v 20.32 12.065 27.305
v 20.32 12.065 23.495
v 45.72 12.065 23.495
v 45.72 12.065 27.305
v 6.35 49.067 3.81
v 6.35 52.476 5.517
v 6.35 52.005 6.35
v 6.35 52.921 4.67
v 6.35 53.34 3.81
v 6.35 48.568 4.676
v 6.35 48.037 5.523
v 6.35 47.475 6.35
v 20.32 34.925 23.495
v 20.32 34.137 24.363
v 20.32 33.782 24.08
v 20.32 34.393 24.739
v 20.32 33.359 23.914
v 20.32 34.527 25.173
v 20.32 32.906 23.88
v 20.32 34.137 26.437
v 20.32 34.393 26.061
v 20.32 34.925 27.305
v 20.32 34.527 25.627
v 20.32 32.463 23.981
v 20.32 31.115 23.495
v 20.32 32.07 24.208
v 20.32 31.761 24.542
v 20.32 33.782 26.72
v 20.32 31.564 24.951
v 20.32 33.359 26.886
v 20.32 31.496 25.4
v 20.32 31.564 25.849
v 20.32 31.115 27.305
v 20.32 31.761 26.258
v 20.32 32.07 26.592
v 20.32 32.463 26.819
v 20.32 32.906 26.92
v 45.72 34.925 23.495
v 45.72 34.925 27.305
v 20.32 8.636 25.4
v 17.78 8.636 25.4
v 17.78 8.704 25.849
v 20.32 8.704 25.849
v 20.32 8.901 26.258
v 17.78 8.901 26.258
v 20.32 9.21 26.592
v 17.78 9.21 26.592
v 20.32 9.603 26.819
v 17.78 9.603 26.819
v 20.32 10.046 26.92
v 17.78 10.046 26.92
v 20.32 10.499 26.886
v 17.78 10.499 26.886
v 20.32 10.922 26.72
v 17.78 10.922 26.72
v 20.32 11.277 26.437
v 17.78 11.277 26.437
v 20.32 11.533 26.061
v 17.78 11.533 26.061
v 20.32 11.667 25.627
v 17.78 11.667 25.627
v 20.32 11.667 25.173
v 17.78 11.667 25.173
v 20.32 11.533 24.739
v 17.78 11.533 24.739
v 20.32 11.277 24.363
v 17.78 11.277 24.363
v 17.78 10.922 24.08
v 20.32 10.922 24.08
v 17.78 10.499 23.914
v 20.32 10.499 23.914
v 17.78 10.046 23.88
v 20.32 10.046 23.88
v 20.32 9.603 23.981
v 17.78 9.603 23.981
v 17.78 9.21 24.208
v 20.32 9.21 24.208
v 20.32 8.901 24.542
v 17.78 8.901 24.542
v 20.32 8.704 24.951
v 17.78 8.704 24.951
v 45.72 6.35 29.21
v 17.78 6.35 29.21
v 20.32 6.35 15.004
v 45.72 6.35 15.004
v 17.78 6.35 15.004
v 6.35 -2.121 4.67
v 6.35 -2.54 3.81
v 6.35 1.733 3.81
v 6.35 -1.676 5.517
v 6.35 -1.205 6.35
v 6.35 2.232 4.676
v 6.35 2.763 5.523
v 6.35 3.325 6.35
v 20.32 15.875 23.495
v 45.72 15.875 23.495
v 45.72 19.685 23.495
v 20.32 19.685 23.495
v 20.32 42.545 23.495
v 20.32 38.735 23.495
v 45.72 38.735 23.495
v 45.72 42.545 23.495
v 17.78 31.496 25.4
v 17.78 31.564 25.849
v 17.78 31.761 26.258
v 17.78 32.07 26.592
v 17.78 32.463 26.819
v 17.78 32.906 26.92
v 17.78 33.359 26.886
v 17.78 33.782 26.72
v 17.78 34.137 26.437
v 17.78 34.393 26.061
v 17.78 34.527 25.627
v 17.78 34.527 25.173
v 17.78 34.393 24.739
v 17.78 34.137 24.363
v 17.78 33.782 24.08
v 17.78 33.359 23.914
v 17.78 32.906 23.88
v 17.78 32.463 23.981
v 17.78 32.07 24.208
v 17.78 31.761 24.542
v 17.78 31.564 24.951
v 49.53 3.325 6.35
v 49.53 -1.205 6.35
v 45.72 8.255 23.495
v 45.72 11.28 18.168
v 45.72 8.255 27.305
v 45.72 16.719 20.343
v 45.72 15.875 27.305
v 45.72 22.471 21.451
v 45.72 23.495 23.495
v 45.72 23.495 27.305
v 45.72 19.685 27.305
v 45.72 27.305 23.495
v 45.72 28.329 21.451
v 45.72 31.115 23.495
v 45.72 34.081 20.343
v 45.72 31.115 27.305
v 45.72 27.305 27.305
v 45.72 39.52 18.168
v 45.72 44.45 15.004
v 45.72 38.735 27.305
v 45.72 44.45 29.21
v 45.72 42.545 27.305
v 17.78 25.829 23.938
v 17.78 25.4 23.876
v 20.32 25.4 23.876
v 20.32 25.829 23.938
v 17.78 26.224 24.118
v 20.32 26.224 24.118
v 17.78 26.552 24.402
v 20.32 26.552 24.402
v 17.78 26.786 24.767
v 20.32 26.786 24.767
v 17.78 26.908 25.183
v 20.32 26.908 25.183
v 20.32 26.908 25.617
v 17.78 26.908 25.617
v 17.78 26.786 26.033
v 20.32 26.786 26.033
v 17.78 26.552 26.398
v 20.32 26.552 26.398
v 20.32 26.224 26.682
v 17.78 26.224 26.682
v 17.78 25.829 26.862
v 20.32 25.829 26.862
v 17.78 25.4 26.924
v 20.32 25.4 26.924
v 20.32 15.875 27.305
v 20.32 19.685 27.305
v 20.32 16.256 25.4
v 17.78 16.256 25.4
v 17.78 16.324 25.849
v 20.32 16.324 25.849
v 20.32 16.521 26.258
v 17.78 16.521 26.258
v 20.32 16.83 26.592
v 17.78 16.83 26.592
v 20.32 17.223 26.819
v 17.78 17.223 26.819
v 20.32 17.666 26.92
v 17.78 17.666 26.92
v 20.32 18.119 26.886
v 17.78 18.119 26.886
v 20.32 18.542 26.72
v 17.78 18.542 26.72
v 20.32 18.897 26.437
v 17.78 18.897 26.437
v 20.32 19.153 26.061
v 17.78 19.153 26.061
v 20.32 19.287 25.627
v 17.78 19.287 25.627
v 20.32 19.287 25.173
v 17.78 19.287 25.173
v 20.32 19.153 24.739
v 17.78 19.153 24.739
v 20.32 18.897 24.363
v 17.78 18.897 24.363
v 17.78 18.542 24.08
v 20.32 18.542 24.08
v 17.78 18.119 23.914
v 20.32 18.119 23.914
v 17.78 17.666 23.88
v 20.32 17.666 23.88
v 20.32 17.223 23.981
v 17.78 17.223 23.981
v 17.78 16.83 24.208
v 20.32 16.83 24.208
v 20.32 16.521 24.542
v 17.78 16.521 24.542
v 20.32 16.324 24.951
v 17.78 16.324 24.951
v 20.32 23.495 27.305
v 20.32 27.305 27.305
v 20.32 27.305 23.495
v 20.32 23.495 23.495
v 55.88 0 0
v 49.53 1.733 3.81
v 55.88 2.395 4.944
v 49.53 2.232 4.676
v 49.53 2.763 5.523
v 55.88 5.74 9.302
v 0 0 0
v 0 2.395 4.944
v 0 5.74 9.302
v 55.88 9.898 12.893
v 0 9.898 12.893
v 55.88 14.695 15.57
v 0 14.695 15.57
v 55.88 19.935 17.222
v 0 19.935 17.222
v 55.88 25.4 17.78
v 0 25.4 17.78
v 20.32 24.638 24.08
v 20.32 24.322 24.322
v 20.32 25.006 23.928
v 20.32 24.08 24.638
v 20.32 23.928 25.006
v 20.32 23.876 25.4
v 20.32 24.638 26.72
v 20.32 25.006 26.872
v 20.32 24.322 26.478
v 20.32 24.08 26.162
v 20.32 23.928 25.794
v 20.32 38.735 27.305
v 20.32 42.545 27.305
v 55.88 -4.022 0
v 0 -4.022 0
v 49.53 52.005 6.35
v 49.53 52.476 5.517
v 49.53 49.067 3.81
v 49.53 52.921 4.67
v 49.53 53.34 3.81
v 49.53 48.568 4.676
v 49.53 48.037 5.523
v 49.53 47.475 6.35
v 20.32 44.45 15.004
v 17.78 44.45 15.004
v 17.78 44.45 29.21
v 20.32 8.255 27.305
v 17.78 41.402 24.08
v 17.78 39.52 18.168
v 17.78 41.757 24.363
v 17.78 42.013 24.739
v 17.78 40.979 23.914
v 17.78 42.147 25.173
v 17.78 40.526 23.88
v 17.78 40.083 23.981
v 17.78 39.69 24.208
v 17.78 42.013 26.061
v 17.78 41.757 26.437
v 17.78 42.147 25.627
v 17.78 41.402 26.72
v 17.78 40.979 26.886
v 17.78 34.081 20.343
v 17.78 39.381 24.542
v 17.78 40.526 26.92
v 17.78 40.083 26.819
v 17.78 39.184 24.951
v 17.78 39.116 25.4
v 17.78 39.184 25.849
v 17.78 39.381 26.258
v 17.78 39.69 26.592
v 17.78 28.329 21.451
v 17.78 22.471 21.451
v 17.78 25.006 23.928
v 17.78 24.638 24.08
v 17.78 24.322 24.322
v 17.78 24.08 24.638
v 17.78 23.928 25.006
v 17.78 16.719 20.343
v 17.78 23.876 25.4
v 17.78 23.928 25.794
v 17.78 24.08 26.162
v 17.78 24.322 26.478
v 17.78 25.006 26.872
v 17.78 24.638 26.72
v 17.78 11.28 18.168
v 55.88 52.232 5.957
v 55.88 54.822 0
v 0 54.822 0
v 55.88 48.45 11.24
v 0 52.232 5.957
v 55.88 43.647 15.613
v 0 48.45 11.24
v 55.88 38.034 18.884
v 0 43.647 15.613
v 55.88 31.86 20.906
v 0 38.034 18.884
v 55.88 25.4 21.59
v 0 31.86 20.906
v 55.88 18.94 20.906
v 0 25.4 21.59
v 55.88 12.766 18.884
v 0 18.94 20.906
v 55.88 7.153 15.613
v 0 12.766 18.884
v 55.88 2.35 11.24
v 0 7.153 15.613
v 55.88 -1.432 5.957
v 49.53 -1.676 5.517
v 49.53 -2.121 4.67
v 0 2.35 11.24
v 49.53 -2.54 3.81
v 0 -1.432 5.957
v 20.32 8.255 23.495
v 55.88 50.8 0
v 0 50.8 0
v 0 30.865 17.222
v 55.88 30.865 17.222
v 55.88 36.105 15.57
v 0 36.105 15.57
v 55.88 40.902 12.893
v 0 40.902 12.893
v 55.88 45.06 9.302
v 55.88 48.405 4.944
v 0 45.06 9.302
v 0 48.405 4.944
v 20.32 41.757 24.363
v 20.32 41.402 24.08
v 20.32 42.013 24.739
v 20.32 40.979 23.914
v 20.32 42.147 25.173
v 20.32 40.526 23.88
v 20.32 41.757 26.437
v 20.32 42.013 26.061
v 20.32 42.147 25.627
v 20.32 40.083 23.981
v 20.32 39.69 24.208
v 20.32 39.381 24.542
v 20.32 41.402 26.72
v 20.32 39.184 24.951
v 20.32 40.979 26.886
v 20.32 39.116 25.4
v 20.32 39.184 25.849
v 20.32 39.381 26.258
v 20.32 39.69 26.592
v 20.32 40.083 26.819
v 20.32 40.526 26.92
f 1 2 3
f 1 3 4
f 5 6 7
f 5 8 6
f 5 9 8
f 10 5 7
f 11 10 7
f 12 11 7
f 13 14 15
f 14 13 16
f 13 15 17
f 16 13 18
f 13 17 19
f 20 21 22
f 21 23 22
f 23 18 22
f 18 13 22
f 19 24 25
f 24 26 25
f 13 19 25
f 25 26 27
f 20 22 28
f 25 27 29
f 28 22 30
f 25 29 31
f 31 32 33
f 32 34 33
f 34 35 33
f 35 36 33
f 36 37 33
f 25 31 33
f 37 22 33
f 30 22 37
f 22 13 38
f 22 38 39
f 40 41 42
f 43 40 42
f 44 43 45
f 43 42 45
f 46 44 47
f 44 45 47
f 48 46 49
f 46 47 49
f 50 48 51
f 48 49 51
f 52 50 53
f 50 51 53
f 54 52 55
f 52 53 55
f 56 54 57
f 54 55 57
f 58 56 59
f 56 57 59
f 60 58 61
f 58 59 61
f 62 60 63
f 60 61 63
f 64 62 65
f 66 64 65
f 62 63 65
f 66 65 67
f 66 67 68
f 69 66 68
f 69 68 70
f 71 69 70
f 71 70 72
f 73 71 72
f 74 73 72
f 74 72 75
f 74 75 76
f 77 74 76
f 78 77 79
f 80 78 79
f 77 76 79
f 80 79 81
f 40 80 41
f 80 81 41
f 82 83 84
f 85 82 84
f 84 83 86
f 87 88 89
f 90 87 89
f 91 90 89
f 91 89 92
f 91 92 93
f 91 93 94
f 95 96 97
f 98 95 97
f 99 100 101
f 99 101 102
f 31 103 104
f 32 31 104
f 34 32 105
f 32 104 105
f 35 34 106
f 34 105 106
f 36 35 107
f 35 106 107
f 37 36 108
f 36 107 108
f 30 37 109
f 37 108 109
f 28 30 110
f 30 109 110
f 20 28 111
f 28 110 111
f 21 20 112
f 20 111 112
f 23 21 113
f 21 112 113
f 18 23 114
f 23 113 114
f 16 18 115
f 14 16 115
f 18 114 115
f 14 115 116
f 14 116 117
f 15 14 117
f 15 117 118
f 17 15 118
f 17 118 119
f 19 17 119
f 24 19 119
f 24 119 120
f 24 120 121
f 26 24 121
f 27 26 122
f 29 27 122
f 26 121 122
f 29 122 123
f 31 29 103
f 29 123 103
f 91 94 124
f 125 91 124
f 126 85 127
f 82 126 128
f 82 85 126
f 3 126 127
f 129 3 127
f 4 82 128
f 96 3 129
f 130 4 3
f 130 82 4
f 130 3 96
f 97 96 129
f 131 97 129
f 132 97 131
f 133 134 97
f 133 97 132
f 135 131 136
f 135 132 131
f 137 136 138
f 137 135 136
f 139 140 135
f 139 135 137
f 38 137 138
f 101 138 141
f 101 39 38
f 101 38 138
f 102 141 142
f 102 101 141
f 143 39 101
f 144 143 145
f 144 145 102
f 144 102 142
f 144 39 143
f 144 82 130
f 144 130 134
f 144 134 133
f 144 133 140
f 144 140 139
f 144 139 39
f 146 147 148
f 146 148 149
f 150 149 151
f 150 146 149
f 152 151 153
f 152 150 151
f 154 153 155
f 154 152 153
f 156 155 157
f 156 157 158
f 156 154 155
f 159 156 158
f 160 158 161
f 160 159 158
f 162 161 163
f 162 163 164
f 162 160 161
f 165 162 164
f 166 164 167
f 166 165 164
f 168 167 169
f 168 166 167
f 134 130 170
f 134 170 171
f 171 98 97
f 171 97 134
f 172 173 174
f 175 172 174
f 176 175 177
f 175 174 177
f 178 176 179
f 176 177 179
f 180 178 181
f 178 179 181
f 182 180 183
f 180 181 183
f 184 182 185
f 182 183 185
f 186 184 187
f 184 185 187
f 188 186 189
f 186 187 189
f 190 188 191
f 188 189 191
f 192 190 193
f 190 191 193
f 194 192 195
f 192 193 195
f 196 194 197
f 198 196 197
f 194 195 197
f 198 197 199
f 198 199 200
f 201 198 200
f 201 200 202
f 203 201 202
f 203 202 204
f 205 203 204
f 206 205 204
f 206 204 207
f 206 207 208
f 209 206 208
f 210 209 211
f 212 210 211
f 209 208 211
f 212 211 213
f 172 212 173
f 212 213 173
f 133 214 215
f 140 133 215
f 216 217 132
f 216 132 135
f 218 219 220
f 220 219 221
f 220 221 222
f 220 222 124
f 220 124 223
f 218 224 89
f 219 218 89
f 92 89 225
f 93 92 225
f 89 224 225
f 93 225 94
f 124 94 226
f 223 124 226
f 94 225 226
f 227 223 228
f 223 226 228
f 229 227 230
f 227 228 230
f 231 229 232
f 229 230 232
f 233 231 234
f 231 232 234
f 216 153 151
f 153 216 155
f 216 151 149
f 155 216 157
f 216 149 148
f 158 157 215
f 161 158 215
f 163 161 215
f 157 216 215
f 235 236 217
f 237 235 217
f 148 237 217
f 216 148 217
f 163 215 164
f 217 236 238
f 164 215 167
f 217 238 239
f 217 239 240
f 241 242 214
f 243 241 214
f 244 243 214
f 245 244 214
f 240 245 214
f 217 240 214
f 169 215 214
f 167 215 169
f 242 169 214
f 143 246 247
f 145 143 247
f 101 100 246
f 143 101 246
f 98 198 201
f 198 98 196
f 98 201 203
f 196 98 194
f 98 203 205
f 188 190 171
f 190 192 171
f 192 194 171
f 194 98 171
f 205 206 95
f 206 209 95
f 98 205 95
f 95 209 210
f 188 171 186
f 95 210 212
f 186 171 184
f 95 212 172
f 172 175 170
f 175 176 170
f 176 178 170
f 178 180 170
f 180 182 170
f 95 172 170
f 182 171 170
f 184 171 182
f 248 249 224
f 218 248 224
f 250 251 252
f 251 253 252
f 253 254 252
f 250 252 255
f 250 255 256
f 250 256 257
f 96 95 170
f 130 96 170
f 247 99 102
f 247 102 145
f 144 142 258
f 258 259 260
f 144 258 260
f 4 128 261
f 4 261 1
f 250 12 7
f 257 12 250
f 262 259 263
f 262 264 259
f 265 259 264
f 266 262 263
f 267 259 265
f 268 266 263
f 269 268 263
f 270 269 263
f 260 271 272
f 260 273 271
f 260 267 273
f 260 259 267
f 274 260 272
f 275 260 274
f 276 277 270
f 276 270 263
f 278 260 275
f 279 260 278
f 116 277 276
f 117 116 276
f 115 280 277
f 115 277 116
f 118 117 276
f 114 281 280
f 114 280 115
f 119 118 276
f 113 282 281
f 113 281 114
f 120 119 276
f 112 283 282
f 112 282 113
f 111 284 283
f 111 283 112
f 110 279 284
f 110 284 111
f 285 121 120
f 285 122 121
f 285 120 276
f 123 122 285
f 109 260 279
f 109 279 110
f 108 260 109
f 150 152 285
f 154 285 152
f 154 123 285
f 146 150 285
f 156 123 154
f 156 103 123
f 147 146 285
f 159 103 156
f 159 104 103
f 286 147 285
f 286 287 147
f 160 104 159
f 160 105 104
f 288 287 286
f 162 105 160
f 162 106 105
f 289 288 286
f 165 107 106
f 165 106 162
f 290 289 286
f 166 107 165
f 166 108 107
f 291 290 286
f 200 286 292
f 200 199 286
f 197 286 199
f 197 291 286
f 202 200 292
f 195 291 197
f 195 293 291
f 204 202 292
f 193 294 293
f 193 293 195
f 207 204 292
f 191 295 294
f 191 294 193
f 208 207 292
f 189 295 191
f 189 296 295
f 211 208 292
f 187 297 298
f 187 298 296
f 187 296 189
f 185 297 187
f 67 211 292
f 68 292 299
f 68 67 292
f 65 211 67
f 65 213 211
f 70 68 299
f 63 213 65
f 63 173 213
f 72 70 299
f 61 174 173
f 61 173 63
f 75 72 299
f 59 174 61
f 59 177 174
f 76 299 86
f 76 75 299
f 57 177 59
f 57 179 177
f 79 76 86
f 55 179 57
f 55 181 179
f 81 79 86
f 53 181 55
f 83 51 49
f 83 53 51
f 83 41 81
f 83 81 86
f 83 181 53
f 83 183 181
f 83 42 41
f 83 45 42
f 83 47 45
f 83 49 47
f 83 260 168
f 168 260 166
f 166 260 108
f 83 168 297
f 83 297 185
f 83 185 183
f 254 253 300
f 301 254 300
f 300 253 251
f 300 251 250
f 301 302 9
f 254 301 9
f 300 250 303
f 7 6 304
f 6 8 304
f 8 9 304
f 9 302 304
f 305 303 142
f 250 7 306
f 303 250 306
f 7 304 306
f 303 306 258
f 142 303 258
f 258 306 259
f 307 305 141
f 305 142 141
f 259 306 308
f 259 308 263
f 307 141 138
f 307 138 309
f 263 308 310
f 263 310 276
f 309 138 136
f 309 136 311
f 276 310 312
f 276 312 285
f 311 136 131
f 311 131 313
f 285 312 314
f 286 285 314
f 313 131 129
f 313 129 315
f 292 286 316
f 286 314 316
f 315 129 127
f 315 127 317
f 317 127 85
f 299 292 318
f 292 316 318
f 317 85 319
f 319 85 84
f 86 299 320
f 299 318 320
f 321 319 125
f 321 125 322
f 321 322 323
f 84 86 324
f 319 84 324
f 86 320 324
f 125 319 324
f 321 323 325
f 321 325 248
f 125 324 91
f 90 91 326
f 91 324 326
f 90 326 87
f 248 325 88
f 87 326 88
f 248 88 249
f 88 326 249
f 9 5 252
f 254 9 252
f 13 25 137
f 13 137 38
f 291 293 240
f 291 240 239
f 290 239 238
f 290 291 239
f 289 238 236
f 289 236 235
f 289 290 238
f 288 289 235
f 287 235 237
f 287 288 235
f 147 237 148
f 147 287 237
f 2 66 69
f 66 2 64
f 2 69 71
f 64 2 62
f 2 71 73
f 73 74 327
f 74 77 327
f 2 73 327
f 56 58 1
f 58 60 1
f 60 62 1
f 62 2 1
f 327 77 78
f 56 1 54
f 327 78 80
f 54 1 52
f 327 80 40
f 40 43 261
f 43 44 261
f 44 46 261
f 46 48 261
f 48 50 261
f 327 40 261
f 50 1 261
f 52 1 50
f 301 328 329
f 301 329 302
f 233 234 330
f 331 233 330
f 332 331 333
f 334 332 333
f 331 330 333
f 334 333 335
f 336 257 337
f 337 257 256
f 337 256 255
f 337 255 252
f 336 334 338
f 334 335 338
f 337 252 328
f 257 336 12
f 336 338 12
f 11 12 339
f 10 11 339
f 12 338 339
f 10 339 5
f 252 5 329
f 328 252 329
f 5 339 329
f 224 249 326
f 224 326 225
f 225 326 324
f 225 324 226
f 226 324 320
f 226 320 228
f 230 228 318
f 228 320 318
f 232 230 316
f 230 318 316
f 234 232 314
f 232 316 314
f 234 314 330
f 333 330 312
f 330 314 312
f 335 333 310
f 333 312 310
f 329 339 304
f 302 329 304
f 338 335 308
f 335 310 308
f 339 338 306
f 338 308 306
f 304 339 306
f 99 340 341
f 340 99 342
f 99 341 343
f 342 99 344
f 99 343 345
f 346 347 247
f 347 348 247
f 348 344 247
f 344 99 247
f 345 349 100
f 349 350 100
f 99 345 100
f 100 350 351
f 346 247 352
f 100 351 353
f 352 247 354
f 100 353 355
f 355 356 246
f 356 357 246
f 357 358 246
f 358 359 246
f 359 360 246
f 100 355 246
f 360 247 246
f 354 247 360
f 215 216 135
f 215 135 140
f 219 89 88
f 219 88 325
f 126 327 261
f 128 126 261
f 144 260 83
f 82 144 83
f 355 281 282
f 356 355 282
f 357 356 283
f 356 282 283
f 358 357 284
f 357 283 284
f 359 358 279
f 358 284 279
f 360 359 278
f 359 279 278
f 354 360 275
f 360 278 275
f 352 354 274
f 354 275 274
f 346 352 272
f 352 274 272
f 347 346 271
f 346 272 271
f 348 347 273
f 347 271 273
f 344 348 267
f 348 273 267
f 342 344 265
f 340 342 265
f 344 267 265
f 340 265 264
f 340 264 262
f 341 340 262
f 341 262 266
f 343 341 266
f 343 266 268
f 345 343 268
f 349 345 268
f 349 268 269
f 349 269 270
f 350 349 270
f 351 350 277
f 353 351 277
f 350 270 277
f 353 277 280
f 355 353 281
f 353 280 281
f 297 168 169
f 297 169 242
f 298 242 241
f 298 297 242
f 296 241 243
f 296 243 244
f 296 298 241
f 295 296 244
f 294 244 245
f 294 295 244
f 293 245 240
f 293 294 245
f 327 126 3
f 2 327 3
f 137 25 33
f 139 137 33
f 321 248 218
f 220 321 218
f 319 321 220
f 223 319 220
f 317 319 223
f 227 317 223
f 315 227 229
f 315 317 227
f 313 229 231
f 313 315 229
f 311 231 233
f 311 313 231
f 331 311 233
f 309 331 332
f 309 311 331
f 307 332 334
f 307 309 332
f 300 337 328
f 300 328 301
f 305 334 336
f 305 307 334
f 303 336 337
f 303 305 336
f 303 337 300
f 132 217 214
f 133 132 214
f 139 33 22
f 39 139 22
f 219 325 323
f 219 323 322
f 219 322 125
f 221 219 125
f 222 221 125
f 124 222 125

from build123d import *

# Parameters (mm, degrees)
F1_DEPTH      = 55.88
F3_R          = 1.524
F4_DEPTH      = 2.54
F5_W          = 43.18
F5_H          = 2.54
F6_DEPTH      = 54.8232105123
F6_DEPTH_BACK = 25.4
F7_W          = 3.81
F7_H          = 3.81
F8_DEPTH      = 25.4


with BuildPart() as f1:
    # F0 (on Right) → F1 (new body)
    with BuildSketch(Plane.YZ):
        with BuildLine():
            Line((-4.0222105123, 0), (0, 0))
            ThreePointArc((0, 0), (9.897674368, 12.8933223314), (25.4, 17.78))
            ThreePointArc((25.4, 17.78), (40.902325632, 12.8933223314), (50.8, 0))
            Line((50.8, 0), (54.8222105123, 0))
            ThreePointArc((54.8222105123, 0), (25.4, 21.59), (-4.0222105123, 0))
        make_face()
    extrude(amount=F1_DEPTH)

    # F3 (on offset) → F4 (join)
    with BuildSketch(Plane(origin=(17.78, 0, 0), x_dir=(0, -1, 0), z_dir=(-1, 0, 0))):
        with BuildLine():
            ThreePointArc((-44.45, 13.97), (-35.6587389576, 19.614347394), (-25.4, 21.59))
            Line((-25.4, 21.59), (-25.4, 23.876))
            ThreePointArc((-25.4, 23.876), (-26.924, 25.4), (-25.4, 26.924))
            Line((-25.4, 26.924), (-25.4, 29.21))
            Line((-25.4, 29.21), (-44.45, 29.21))
            Line((-44.45, 29.21), (-44.45, 13.97))
        make_face()
        with Locations((-40.64, 25.4)):
            Circle(F3_R, mode=Mode.SUBTRACT)
        with Locations((-33.02, 25.4)):
            Circle(F3_R, mode=Mode.SUBTRACT)
        with BuildLine():
            Line((-25.4, 23.876), (-25.4, 21.59))
            ThreePointArc((-25.4, 21.59), (-15.1412610424, 19.614347394), (-6.35, 13.97))
            Line((-6.35, 13.97), (-6.35, 29.21))
            Line((-6.35, 29.21), (-25.4, 29.21))
            Line((-25.4, 29.21), (-25.4, 26.924))
            ThreePointArc((-25.4, 26.924), (-24.3223692655, 26.4776307345), (-23.876, 25.4))
            ThreePointArc((-23.876, 25.4), (-24.3223692655, 24.3223692655), (-25.4, 23.876))
        make_face()
        with Locations((-17.78, 25.4)):
            Circle(F3_R, mode=Mode.SUBTRACT)
        with Locations((-10.16, 25.4)):
            Circle(F3_R, mode=Mode.SUBTRACT)
    extrude(amount=-F4_DEPTH)

    # F5 (on Front) → F6 (cut, two sides)
    with BuildSketch(Plane.XZ) as f6_sk:
        with Locations((27.94, 5.08)):
            Rectangle(F5_W, F5_H)
    extrude(amount=-F6_DEPTH, mode=Mode.SUBTRACT)
    extrude(f6_sk.sketch, amount=F6_DEPTH_BACK, mode=Mode.SUBTRACT)

    # F7 (on face) → F8 (join)
    with BuildSketch(Plane.YZ.offset(20.32)):
        with BuildLine():
            Line((6.35, 29.21), (6.35, 15.0036746936))
            ThreePointArc((6.35, 15.0036746936), (25.4, 21.59), (44.45, 15.0036746936))
            Line((44.45, 15.0036746936), (44.45, 29.21))
            Line((44.45, 29.21), (6.35, 29.21))
        make_face()
        with Locations((10.16, 25.4)):
            Rectangle(F7_W, F7_H, mode=Mode.SUBTRACT)
        with Locations((17.78, 25.4)):
            Rectangle(F7_W, F7_H, mode=Mode.SUBTRACT)
        with Locations((25.4, 25.4)):
            Rectangle(F7_W, F7_H, mode=Mode.SUBTRACT)
        with Locations((33.02, 25.4)):
            Rectangle(F7_W, F7_H, mode=Mode.SUBTRACT)
        with Locations((40.64, 25.4)):
            Rectangle(F7_W, F7_H, mode=Mode.SUBTRACT)
    extrude(amount=F8_DEPTH)


solid = f1.part
